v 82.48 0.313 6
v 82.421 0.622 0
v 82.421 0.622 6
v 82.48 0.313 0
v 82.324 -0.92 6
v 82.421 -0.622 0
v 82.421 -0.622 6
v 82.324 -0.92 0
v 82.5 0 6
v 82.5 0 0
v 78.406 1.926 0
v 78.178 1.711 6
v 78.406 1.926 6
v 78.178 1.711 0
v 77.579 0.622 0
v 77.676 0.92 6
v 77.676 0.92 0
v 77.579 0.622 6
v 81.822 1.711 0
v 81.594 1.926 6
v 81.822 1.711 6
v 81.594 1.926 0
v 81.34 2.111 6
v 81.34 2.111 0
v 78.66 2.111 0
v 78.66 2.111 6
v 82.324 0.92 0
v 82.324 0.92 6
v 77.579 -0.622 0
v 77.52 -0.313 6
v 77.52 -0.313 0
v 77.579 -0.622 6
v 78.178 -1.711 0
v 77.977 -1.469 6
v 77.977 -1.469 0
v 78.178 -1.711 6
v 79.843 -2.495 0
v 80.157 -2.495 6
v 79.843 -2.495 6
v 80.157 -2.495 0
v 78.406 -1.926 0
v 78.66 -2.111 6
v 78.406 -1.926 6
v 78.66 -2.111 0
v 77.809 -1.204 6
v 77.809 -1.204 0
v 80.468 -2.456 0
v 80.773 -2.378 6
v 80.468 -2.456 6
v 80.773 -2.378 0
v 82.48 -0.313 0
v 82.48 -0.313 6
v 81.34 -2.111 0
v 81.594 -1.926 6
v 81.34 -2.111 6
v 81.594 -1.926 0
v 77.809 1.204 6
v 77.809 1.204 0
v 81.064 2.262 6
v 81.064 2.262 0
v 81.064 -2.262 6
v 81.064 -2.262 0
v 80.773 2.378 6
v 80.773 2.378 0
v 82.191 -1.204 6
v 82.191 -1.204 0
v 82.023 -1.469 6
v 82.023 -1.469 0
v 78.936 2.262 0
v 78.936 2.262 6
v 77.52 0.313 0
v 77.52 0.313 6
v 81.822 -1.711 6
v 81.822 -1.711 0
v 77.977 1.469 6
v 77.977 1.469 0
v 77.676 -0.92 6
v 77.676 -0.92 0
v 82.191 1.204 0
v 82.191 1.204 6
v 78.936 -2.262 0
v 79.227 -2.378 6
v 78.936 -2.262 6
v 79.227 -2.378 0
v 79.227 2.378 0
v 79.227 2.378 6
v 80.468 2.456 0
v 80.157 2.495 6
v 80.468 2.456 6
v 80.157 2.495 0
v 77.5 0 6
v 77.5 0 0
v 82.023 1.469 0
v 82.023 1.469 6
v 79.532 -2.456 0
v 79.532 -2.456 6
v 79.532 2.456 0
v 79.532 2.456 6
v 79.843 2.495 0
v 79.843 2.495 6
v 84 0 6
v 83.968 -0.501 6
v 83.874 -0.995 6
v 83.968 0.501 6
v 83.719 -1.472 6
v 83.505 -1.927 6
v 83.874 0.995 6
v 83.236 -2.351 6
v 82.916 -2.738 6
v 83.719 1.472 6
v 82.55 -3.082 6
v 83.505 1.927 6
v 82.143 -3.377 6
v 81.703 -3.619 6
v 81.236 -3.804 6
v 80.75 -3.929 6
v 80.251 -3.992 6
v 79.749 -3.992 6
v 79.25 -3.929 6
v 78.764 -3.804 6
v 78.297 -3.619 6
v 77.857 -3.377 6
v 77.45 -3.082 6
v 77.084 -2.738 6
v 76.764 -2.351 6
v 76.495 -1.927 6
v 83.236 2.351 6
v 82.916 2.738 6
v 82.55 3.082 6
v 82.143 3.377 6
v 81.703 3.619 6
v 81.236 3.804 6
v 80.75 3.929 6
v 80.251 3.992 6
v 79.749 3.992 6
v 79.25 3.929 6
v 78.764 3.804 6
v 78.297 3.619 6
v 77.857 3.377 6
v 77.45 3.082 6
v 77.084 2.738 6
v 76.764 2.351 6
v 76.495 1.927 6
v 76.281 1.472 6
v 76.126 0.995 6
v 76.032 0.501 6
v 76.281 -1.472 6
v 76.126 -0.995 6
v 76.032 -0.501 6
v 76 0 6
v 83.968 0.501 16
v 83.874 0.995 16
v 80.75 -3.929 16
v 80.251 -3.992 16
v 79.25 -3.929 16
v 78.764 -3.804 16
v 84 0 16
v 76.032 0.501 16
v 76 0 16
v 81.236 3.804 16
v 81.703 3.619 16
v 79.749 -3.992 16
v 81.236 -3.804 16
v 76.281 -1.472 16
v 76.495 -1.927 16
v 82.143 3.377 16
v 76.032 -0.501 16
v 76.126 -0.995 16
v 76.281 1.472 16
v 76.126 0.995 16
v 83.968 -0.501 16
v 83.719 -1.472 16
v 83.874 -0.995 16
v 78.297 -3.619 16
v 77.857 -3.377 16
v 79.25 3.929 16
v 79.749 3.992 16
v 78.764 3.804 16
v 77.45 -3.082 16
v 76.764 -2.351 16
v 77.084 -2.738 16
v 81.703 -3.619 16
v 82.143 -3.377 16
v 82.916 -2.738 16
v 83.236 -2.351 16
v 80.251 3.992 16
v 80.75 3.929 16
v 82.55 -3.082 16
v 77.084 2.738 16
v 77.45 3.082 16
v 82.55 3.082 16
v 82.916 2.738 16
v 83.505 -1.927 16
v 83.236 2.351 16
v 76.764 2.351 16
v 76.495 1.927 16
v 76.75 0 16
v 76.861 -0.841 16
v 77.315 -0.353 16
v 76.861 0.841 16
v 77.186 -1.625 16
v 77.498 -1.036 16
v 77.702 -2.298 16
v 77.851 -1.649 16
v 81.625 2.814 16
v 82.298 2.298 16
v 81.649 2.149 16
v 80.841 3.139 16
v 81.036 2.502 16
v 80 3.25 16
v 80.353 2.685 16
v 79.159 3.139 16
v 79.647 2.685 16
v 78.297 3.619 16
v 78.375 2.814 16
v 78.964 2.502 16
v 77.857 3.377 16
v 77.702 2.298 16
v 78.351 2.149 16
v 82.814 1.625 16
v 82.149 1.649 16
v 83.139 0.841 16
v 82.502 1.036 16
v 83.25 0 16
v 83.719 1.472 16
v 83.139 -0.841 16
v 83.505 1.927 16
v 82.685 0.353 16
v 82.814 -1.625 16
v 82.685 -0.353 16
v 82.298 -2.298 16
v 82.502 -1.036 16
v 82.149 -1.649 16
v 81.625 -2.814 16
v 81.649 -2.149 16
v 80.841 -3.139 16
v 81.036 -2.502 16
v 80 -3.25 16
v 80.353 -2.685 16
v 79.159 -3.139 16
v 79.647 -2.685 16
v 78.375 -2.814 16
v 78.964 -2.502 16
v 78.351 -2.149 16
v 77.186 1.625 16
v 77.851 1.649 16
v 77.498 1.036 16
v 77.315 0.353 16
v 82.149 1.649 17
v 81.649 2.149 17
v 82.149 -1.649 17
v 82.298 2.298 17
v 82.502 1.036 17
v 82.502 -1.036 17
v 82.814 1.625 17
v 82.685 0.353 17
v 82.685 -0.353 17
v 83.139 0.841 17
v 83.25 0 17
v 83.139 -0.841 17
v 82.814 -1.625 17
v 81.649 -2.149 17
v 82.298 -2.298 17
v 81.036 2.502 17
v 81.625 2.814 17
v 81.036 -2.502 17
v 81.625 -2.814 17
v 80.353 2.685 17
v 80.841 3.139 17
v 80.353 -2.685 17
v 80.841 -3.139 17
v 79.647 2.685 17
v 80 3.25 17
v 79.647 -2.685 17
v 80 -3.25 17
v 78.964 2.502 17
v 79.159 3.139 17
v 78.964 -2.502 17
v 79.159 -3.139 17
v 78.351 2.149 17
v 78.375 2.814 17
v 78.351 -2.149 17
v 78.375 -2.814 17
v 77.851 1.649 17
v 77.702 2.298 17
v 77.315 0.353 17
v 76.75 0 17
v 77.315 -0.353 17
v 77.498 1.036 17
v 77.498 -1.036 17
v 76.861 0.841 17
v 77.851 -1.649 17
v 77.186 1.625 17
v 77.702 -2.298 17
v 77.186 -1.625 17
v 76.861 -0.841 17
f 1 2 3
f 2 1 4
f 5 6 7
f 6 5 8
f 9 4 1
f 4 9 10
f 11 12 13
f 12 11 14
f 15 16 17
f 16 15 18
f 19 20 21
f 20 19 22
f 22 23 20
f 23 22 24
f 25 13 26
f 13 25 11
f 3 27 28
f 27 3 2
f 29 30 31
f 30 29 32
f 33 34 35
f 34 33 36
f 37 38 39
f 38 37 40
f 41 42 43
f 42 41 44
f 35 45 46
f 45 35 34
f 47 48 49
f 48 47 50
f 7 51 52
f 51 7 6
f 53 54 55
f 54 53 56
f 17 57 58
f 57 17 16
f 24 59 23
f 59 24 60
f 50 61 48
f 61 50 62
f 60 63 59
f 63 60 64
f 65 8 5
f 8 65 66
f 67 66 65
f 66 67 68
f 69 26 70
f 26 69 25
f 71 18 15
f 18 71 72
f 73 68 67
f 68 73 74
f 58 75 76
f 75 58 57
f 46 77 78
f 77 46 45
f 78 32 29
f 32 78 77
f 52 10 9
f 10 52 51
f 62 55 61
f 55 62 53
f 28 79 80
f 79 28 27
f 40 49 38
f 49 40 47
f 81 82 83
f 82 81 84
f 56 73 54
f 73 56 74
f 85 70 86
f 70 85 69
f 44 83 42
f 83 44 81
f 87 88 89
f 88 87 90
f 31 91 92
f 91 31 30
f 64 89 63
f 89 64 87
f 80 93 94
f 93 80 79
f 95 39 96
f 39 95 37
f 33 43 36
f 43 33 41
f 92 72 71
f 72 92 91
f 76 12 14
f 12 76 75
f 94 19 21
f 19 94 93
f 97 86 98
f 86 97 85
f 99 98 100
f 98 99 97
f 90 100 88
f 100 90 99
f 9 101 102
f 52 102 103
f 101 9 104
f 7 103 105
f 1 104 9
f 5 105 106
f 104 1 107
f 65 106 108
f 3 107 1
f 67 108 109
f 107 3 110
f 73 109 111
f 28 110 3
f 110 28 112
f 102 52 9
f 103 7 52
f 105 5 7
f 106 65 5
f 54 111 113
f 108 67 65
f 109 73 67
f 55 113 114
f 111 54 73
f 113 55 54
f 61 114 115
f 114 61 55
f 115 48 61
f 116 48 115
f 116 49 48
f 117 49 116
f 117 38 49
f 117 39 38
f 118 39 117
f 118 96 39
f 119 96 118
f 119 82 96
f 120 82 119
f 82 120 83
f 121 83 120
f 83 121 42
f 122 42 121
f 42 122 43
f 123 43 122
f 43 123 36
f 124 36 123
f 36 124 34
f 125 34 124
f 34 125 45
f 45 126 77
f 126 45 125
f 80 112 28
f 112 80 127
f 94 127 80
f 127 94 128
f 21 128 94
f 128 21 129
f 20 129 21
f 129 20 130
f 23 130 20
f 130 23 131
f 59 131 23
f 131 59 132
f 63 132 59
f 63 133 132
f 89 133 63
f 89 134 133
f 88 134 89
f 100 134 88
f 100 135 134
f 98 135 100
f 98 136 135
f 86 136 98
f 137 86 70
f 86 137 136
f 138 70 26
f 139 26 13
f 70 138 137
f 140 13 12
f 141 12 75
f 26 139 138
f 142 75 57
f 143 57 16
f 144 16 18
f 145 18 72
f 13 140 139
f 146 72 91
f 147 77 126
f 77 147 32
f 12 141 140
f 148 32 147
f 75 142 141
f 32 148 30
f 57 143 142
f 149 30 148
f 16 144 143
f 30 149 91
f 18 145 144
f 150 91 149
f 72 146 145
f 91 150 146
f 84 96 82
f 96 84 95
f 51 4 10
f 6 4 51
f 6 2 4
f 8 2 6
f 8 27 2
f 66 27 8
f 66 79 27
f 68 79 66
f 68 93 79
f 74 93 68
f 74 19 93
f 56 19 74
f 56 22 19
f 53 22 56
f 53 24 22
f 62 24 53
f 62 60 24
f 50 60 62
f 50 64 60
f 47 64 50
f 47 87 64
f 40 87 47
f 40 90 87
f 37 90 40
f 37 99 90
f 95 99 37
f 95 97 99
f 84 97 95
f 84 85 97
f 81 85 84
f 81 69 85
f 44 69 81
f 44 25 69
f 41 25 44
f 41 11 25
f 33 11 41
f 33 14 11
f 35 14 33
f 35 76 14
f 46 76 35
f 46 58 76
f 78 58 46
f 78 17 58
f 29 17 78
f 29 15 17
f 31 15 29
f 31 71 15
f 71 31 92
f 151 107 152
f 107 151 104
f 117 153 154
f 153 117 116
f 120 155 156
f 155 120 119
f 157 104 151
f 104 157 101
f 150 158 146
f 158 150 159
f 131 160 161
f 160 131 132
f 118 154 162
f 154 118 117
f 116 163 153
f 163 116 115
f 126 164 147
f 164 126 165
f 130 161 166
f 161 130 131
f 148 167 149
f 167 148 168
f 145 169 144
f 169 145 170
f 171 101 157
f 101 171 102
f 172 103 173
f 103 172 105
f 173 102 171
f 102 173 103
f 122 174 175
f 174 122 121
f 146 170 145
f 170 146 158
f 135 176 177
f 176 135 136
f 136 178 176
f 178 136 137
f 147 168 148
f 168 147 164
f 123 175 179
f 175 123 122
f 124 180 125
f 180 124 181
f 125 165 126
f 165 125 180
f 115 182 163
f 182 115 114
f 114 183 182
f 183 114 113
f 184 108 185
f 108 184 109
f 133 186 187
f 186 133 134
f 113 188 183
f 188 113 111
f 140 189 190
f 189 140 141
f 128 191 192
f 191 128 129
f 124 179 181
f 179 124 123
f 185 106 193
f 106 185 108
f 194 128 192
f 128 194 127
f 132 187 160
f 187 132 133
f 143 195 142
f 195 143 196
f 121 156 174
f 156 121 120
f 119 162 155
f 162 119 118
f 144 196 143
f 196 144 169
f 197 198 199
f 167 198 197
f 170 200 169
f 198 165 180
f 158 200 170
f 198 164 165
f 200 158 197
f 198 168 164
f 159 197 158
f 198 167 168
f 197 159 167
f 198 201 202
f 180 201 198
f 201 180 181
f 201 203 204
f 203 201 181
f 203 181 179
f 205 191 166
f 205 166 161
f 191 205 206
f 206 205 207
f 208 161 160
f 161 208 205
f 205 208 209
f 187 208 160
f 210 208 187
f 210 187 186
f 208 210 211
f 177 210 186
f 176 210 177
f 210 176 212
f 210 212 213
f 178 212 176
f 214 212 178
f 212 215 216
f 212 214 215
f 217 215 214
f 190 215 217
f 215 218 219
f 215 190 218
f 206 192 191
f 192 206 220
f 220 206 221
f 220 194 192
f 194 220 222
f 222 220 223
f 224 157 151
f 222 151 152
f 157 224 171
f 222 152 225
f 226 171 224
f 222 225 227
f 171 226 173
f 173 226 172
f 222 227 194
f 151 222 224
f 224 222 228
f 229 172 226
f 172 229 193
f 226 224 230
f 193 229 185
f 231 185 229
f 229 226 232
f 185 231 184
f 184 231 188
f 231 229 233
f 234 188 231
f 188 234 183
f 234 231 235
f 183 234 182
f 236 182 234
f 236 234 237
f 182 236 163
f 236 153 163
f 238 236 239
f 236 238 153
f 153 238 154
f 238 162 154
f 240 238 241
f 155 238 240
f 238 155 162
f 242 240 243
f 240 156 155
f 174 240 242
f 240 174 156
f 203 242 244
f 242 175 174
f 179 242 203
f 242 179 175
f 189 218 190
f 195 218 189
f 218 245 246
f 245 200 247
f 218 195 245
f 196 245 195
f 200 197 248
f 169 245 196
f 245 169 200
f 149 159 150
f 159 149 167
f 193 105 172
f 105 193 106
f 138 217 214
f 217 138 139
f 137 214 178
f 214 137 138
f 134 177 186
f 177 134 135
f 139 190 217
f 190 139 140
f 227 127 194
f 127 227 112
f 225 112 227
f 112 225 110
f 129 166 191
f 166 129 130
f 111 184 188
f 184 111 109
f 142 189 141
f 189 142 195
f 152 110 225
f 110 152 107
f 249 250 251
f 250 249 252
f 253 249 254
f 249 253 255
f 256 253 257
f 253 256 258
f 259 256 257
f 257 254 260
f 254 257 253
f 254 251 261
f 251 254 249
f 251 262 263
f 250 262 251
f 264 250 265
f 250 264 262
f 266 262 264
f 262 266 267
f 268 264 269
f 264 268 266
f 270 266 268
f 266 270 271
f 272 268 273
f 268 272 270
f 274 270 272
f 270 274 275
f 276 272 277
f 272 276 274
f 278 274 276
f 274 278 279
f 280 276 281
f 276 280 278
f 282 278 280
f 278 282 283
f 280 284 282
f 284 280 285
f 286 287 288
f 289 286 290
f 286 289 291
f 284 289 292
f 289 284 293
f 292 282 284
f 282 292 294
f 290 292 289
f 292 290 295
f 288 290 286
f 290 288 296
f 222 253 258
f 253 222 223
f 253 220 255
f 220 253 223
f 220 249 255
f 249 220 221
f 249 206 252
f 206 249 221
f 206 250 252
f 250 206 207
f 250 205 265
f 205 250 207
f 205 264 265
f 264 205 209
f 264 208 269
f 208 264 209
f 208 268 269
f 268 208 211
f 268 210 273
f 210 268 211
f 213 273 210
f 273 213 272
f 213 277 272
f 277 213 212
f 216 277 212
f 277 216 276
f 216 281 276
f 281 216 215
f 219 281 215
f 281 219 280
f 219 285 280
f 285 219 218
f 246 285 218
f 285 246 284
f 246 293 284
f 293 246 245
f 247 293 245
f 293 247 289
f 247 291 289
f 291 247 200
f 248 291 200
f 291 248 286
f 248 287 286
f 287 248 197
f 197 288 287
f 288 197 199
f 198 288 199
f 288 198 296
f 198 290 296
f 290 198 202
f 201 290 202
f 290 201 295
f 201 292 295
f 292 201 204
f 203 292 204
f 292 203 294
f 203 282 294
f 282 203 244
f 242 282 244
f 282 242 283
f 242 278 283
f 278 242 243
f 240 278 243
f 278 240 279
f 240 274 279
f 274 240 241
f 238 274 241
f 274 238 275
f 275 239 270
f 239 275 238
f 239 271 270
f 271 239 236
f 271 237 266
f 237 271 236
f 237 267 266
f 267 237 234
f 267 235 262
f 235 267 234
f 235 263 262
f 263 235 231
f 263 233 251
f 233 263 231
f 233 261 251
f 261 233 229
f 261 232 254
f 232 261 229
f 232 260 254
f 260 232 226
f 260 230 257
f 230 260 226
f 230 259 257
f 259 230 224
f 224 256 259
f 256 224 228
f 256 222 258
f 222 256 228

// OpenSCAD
// file: Star.scad
// points = number of points (minimum 3)
// outer  = radius to outer points
// inner  = radius to inner points
module Star(points, outer, inner) {
	
	// polar to cartesian: radius/angle to x/y
	function x(r, a) = r * cos(a);
	function y(r, a) = r * sin(a);
	
	// angular width of each pie slice of the star
	increment = 360/points;
	
	union() {
		for (p = [0 : points-1]) {
			
			// outer is outer point p
			// inner is inner point following p
			// next is next outer point following p

			x_outer = x(outer, increment * p);
            y_outer = y(outer, increment * p);
            x_inner = x(inner, (increment * p) + (increment/2));
            y_inner = y(inner, (increment * p) + (increment/2));
            x_next  = x(outer, increment * (p+1));
            y_next  = y(outer, increment * (p+1));
            polygon(
                points = [
                    [x_outer, y_outer],
                    [x_inner, y_inner],
                    [x_next, y_next],
                    [0, 0]
                ],
                paths  = [[0, 1, 2, 3]]
            );
        }
    }
}

module Pentagram(outer) {
    inner = outer*sqrt(3.5-1.5*sqrt(5));
    Star(5,outer, inner);
}
// main file
include <Star.scad>;

pegBaseHeight = 0.6;
pegTopHeight = 1;
symbolHeight = 0.1;

pegBaseD = 0.5;
pegTopD = 0.8;
symbolD = 0.65;

pegSpacing = 2;

module Peg(pegColor, topSymbol){
    color(pegColor)
    linear_extrude(pegBaseHeight)
    circle(d=pegBaseD, $fn=50);

    color(pegColor)
    translate([0,0,pegBaseHeight])
    linear_extrude(pegTopHeight)
    circle(d=pegTopD, $fn=50);
}

scale (10){
    /*
translate([pegSpacing * 0,0]){
    pegColor = "green";
    Peg(pegColor);
    color(pegColor)
    translate([0,0,pegBaseHeight + pegTopHeight])
    linear_extrude(symbolHeight)
    circle (d=symbolD, $fn=50);
}


translate([pegSpacing,0]){
    pegColor = "orange";
    Peg(pegColor);

    color(pegColor)
    translate([0,0,pegBaseHeight + pegTopHeight])
    linear_extrude(symbolHeight)
    circle (d=symbolD, $fn=6);
}

translate([pegSpacing * 2,0]){
    pegColor = "#f0f";
    Peg(pegColor);

    color(pegColor)
    translate([0,0,pegBaseHeight + pegTopHeight])
    linear_extrude(symbolHeight)
    difference(){
        circle (d=symbolD, $fn=50);
        circle (d=symbolD - symbolD / 5, $fn=50);
    }
}

translate([pegSpacing * 3,0]){
    pegColor = "#55f";
    Peg(pegColor);

    color(pegColor)
    translate([0,0,pegBaseHeight + pegTopHeight])
    linear_extrude(symbolHeight)
    Star(6, symbolD/2, symbolD/2 - symbolD/4.5);
}

*/

translate([pegSpacing * 4,0]){
    pegColor = "yellow";
    Peg(pegColor);

    color(pegColor)
    translate([0,0,pegBaseHeight + pegTopHeight])
    linear_extrude(symbolHeight)
    Star(24, symbolD/2, symbolD/2 - symbolD/12);
}
/*
translate([pegSpacing * 5,0]){
    pegColor = "#f33";
    Peg(pegColor);

    color(pegColor)
    translate([0,0,pegBaseHeight + pegTopHeight])
    linear_extrude(symbolHeight)
    Star(12, symbolD/2, symbolD/2 - symbolD/6);
}
*/
}
